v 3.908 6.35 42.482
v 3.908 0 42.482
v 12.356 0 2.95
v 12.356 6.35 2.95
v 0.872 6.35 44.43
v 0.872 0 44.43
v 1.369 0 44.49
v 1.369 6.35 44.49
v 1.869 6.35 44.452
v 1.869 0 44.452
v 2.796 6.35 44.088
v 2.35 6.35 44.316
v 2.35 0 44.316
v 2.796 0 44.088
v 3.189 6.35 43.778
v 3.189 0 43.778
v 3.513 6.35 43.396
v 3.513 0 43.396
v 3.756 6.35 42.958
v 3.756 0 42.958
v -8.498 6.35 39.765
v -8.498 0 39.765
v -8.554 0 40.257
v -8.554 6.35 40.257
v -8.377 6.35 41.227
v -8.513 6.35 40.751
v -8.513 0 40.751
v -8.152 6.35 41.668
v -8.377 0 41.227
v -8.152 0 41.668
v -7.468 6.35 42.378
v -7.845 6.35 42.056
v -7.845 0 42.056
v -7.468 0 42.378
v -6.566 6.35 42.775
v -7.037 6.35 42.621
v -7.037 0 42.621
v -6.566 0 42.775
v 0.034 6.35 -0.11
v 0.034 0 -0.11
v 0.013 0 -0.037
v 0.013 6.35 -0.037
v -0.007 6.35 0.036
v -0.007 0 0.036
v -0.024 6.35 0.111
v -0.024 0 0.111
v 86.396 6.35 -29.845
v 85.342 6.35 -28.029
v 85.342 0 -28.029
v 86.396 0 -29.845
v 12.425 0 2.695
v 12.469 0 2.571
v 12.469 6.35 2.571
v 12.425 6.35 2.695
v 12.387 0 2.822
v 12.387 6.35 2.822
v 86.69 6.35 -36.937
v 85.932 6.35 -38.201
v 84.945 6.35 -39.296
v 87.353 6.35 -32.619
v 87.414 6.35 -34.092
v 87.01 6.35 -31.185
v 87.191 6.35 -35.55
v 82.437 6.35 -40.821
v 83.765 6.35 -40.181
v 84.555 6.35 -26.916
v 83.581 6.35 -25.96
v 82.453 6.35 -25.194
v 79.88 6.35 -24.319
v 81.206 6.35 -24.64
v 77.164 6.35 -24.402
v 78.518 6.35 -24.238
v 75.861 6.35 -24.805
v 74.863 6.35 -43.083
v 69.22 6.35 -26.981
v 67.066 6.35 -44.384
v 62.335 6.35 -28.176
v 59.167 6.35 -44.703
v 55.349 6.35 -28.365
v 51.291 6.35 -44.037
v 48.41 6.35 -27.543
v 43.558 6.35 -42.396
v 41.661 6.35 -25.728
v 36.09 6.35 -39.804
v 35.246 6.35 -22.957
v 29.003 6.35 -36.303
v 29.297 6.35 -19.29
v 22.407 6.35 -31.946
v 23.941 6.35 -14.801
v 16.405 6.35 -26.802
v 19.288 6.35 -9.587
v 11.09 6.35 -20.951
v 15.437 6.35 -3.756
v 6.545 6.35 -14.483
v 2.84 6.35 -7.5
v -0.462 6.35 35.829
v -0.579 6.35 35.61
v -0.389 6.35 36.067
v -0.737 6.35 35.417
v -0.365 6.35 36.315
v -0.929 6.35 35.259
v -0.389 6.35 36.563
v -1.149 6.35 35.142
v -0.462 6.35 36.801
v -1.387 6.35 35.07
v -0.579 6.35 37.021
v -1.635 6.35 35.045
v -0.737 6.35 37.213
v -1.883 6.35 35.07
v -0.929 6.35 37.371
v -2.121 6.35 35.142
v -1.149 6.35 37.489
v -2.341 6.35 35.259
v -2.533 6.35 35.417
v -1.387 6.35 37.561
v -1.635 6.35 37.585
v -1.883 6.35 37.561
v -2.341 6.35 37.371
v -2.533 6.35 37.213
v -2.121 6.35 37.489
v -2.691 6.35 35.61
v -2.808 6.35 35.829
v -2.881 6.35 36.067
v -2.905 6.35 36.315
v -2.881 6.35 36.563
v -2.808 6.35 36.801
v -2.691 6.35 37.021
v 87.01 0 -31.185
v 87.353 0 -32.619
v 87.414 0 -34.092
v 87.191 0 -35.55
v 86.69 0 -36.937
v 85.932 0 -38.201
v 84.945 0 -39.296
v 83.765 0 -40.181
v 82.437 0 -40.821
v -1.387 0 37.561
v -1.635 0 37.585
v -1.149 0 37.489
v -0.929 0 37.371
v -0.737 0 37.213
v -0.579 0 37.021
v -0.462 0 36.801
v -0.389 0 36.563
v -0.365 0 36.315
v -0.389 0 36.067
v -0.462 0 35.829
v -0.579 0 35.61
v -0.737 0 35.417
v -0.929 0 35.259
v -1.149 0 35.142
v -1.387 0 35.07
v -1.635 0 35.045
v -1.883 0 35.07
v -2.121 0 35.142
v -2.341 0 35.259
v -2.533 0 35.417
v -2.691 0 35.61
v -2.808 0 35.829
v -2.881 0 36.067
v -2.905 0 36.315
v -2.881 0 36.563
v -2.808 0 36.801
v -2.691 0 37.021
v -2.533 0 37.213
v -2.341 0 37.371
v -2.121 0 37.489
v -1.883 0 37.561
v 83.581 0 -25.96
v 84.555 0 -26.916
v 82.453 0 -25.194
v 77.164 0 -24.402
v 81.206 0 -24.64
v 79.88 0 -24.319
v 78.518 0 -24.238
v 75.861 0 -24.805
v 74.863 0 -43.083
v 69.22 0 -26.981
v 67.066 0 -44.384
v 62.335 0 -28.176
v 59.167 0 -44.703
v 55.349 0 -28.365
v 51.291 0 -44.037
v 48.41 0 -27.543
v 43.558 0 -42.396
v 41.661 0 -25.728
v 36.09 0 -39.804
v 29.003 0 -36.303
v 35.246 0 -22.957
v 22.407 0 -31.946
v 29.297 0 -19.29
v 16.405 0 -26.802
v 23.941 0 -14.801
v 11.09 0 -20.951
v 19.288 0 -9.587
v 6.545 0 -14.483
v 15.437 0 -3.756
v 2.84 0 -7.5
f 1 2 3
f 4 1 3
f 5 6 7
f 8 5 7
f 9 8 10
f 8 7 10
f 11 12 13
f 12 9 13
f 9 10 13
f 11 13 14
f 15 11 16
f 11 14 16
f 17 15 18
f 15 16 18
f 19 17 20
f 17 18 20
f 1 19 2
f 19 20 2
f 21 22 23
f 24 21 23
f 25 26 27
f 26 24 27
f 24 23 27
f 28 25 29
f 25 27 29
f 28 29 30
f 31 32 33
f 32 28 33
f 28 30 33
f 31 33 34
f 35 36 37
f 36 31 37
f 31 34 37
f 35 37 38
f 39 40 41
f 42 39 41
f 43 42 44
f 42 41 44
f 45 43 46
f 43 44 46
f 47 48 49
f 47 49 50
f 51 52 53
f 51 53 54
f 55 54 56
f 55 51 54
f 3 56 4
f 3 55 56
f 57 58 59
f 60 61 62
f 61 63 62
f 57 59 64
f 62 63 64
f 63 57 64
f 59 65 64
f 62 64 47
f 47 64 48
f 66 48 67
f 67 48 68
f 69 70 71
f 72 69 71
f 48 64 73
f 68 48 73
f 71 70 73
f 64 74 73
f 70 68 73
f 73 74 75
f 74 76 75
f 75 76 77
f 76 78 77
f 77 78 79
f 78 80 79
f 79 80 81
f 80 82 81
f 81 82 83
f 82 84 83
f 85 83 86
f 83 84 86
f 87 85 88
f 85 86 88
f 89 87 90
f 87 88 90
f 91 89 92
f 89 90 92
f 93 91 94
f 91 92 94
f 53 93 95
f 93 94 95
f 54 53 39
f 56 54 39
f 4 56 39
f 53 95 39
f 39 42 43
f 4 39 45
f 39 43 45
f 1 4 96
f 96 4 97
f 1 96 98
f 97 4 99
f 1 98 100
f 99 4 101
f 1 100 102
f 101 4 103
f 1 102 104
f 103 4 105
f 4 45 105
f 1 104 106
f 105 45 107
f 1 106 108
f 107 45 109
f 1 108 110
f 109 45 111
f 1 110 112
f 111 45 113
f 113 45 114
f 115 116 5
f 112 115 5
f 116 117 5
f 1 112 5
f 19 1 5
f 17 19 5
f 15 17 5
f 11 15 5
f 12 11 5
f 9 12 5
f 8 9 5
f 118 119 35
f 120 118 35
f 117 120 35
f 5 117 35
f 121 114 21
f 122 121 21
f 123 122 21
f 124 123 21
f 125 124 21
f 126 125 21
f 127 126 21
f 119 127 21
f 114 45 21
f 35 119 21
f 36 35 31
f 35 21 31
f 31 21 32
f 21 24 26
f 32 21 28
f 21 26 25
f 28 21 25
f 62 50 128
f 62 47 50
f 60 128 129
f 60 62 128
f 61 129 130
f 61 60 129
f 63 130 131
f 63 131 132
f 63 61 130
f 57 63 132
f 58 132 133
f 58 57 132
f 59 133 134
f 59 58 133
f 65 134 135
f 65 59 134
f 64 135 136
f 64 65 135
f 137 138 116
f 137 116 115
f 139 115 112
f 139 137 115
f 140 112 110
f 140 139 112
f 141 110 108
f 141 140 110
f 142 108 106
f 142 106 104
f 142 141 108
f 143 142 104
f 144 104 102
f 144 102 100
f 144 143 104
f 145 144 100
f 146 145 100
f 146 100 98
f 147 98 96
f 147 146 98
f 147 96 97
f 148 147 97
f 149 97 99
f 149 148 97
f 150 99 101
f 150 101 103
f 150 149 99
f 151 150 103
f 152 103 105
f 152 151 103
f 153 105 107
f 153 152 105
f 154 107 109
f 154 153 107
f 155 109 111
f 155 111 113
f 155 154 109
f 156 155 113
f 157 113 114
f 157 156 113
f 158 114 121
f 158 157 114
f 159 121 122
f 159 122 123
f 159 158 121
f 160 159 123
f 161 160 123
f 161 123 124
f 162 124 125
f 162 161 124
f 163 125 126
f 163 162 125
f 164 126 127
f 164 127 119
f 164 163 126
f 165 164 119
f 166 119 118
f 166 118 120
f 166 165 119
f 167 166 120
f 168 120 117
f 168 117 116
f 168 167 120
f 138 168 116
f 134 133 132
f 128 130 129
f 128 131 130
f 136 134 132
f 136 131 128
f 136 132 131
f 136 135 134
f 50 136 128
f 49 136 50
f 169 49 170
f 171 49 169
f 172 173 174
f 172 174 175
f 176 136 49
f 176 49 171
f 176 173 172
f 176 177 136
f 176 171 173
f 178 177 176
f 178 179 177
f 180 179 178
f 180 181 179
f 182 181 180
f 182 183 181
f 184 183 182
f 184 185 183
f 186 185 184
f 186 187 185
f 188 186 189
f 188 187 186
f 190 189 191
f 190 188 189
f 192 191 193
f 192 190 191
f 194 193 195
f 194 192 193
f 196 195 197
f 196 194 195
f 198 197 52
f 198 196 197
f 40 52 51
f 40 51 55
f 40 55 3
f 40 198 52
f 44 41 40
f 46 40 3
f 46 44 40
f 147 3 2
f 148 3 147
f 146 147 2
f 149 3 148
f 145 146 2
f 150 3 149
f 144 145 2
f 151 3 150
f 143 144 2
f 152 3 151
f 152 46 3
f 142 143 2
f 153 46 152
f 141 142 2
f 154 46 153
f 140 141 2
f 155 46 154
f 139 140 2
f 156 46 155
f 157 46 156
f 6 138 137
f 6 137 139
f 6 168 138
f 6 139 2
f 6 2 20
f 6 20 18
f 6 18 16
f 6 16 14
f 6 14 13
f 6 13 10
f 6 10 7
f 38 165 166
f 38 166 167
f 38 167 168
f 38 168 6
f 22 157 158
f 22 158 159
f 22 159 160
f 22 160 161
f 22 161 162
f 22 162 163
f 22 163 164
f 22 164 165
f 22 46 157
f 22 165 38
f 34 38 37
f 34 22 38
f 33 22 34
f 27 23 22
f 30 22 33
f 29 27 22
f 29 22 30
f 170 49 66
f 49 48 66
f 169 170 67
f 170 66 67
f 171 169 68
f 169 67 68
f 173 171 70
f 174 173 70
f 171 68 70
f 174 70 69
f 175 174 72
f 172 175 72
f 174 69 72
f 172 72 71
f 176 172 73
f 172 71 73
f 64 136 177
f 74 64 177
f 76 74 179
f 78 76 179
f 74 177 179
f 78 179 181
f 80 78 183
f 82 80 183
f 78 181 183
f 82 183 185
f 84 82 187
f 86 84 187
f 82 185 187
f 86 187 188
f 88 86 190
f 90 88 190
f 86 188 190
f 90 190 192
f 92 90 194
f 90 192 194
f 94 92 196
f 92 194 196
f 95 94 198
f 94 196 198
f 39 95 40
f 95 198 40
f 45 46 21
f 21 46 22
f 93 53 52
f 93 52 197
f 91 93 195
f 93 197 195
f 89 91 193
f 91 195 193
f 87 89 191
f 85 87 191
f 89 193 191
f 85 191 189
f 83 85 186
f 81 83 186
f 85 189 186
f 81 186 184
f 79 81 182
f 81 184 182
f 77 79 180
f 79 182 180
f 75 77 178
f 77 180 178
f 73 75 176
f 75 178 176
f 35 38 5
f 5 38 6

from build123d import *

# Parameters (mm, degrees)
SKETCH1_R           = 1.27
BOSS_EXTRUDE1_DEPTH = 6.35
FILLET1_R           = 7.62
FILLET2_R           = 2.54


with BuildPart() as part:
    # Sketch1 → Boss-Extrude1 (new body)
    with BuildSketch(Plane(origin=(0, 0, 0), x_dir=(1, 0, 0), z_dir=(0, 1, 0))):
        with BuildLine():
            Line((81.778930412, 21.890352424), (90.625383348, 37.130352424))
            ThreePointArc((90.625383348, 37.130352424), (36.535362906, 39.988317454), (0, 0))
            Line((0, 0), (-9.024498495, -42.227981756))
            Line((-9.024498495, -42.227981756), (3.372757994, -44.986498939))
            Line((3.372757994, -44.986498939), (12.397256489, -2.758517182))
            ThreePointArc((12.397256489, -2.758517182), (41.38133196, 25.629318142), (81.778930412, 21.890352424))
        make_face()
        with Locations(Location((-1.635035265, -36.315193683, 0), (0, 0, 270))):
            Circle(SKETCH1_R, mode=Mode.SUBTRACT)
    extrude(amount=BOSS_EXTRUDE1_DEPTH)

    # Fillet1
    fillet1_edges = [part.edges().sort_by_distance(p)[0] for p in [
        (90.625383348, 3.175, -37.130352424),
        (81.778930412, 3.175, -21.890352424),
    ]]
    fillet(fillet1_edges, radius=FILLET1_R)

    # Fillet2
    # the kernel refuses this fillet: 2.54 mm, written as the material it adds along each edge
    with BuildSketch(Plane(origin=(12.397256489, 0, 2.758517182), x_dir=(0.35622264546587595, 0, -0.9344011059803455), z_dir=(0, 1, 0))) as fillet2_piece_1:
        with BuildLine():
            CenterArc((0.195594606, -2.539994503), FILLET2_R, 89.880796264, 8.924440748)
            Line((-0.193218847, -0.029929942), (0, 0))
            ThreePointArc((0, 0), (0.100439533, 0.000104482), (0.200879066, 0))
        make_face()
    extrude(amount=6.35)
    # the kernel refuses this fillet: 2.54 mm, written as the material it takes off along each edge
    with BuildSketch(Plane(origin=(3.372757994, -6.403575534, 44.986498939), x_dir=(0.20898980989256036, 0, -0.9779178183063603), z_dir=(0, 1, 0))) as fillet2_2_piece_1:
        with BuildLine():
            CenterArc((FILLET2_R * 1.00843709196, FILLET2_R), FILLET2_R, 179.518623791, 90.481376209)
            Line((FILLET2_R * 0.00847238518745, FILLET2_R * 1.00840150095), (0, 0))
            Line((0, 0), (FILLET2_R * 1.00843709196, 0))
        make_face()
    extrude(amount=19.157151068, mode=Mode.SUBTRACT)
    with BuildSketch(Plane(origin=(-9.024498495, -6.296872706, 42.227981756), x_dir=(0.20898980989255983, 0, -0.9779178183063605), z_dir=(0, 1, 0))) as fillet2_2_piece_2:
        with BuildLine():
            CenterArc((FILLET2_R * 0.991633497, -FILLET2_R), FILLET2_R, 90, 89.518623791)
            Line((-FILLET2_R * 0.00833120976845, -FILLET2_R * 0.991598499049), (0, 0))
            Line((0, 0), (FILLET2_R * 0.991633497, 0))
        make_face()
    extrude(amount=18.943745412, mode=Mode.SUBTRACT)
    with BuildSketch(Plane(origin=(0, -0.288692893, 0), x_dir=(0.29511712664232287, 0, -0.9554610832275584), z_dir=(0, 1, 0))) as fillet2_2_piece_3:
        with BuildLine():
            CenterArc((0.11316262, -2.539998945), FILLET2_R, 89.947790074, 5.153611753)
            Line((-0.112690792, -0.010060164), (0, 0))
            ThreePointArc((0, 0), (0.057738579, 2.6307e-05), (0.115477157, 0))
        make_face()
    extrude(amount=6.927385787, mode=Mode.SUBTRACT)


solid = part.part
